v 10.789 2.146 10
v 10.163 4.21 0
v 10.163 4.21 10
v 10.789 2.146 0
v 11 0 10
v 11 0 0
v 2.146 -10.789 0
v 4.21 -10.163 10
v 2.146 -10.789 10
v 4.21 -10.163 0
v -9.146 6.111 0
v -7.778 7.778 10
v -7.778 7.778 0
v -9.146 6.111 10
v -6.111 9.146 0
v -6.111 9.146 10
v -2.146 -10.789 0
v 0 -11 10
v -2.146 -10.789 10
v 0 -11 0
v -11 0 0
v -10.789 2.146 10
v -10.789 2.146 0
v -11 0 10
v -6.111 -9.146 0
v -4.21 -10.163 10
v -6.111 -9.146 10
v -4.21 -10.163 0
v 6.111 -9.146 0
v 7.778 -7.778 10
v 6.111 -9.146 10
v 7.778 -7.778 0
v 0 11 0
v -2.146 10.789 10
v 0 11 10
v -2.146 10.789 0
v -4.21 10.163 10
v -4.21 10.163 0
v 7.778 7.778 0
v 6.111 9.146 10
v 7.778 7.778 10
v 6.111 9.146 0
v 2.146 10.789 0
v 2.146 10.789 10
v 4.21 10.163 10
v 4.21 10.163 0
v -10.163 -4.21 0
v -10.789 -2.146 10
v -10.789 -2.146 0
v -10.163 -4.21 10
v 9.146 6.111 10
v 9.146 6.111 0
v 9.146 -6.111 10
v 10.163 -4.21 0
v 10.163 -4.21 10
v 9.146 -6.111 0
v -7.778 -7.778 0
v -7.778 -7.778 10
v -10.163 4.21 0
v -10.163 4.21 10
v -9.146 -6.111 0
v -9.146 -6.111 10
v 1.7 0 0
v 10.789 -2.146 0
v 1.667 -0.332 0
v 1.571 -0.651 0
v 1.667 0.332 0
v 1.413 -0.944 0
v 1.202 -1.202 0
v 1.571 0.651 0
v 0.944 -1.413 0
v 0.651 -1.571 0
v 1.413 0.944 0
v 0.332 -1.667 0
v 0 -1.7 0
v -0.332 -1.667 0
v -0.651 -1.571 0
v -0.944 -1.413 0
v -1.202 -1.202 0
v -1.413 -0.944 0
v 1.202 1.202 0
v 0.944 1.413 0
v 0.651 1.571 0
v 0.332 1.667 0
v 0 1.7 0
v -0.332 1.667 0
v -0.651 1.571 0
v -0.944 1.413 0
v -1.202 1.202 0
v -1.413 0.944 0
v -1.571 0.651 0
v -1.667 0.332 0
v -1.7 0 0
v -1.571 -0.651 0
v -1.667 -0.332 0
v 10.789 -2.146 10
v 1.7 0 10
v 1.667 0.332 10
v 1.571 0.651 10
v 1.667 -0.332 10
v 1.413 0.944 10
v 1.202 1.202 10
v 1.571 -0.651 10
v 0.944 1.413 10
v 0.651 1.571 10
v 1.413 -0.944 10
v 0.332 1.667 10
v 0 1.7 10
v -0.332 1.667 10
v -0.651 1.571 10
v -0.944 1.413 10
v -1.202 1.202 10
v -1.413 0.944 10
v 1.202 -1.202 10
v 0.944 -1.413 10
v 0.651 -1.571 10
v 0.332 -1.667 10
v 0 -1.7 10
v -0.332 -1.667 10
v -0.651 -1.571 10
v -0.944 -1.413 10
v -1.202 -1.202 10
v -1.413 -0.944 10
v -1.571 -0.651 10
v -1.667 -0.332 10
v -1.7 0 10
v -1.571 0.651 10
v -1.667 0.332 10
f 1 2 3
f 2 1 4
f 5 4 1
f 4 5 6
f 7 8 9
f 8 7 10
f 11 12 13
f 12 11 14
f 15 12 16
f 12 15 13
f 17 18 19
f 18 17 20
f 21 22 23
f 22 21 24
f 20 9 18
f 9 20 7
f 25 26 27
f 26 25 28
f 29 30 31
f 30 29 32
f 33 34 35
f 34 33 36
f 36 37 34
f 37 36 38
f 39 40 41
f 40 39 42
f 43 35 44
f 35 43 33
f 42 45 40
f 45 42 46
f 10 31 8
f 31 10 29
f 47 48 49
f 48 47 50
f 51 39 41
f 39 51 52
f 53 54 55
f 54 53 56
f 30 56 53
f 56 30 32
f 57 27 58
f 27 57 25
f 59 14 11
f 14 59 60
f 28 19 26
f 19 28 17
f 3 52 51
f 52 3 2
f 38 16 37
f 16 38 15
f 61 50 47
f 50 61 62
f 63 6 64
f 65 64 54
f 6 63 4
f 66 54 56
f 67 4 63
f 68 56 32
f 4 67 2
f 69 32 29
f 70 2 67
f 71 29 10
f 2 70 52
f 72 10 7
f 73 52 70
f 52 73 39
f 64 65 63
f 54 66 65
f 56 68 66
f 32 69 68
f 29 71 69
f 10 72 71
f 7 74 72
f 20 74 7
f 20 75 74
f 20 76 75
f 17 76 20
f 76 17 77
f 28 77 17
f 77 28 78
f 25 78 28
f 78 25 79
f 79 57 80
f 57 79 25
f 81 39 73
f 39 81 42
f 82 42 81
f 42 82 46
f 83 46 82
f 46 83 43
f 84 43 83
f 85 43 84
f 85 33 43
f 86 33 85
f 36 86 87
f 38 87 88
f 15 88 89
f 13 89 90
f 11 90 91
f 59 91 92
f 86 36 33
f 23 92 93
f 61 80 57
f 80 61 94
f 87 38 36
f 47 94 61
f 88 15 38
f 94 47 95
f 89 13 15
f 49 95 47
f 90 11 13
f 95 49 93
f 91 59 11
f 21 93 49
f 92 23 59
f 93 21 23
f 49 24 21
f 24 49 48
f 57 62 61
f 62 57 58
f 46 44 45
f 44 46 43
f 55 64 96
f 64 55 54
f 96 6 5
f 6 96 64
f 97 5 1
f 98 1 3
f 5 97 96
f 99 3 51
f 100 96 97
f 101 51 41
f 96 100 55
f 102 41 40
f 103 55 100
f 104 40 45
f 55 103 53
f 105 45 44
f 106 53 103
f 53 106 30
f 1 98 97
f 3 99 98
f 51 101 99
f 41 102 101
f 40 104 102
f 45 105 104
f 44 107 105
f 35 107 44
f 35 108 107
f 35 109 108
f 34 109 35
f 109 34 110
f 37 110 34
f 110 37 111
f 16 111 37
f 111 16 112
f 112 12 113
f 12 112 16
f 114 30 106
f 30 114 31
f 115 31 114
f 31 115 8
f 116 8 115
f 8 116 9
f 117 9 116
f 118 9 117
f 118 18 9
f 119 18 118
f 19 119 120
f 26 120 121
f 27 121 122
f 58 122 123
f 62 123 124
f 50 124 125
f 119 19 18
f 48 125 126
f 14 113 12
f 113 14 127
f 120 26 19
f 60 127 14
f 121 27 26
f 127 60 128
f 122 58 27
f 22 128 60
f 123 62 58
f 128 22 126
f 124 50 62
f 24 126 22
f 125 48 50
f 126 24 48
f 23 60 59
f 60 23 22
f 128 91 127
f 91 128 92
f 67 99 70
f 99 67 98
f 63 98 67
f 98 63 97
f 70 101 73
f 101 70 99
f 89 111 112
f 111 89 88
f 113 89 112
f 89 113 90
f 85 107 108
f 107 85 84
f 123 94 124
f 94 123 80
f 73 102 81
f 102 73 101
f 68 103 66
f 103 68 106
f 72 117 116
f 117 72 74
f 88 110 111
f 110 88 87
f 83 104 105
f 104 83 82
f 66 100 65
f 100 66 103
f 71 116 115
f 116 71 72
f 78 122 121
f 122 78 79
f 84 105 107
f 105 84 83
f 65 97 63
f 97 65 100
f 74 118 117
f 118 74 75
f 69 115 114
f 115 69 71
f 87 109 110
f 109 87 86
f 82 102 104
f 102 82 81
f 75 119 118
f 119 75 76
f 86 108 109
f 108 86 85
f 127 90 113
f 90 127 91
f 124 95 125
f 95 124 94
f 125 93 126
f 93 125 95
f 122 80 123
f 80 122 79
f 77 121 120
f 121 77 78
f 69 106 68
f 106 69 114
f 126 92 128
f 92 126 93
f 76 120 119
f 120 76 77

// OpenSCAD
// ModuDeck donor chassis study: NOT a verified ThinkPad fit.
// Millimetres. 370x240 is an unconfirmed owner measurement.
$fn=32; W=370; D=240; t=3;
module plate(w,d,h){cube([w,d,h]);}
module shell(w,d,h){difference(){cube([w,d,h]);translate([t,t,t])cube([w-2*t,d-2*t,h]);}}
module hole(x,y,h){translate([x,y,-1])cylinder(d=3.4,h=h+2);}
module rail(n){difference(){cube([n,12,6]);for(x=[10:20:n-10])hole(x,6,6);}}
module rear(){difference(){cube([W-6,3,25]);translate([W/2-23,-1,6])cube([40,5,14]);for(x=[10,W-16])translate([x,-1,12])rotate([-90,0,0])cylinder(d=3.4,h=5);}}
module tray(){difference(){shell(W,D,30);translate([3,D-4,3])cube([W-6,6,27]);for(x=[15,W-15],y=[15,D-15])hole(x,y,30);}}
difference(){cylinder(d=22,h=10);translate([0,0,-1])cylinder(d=3.4,h=12);}
